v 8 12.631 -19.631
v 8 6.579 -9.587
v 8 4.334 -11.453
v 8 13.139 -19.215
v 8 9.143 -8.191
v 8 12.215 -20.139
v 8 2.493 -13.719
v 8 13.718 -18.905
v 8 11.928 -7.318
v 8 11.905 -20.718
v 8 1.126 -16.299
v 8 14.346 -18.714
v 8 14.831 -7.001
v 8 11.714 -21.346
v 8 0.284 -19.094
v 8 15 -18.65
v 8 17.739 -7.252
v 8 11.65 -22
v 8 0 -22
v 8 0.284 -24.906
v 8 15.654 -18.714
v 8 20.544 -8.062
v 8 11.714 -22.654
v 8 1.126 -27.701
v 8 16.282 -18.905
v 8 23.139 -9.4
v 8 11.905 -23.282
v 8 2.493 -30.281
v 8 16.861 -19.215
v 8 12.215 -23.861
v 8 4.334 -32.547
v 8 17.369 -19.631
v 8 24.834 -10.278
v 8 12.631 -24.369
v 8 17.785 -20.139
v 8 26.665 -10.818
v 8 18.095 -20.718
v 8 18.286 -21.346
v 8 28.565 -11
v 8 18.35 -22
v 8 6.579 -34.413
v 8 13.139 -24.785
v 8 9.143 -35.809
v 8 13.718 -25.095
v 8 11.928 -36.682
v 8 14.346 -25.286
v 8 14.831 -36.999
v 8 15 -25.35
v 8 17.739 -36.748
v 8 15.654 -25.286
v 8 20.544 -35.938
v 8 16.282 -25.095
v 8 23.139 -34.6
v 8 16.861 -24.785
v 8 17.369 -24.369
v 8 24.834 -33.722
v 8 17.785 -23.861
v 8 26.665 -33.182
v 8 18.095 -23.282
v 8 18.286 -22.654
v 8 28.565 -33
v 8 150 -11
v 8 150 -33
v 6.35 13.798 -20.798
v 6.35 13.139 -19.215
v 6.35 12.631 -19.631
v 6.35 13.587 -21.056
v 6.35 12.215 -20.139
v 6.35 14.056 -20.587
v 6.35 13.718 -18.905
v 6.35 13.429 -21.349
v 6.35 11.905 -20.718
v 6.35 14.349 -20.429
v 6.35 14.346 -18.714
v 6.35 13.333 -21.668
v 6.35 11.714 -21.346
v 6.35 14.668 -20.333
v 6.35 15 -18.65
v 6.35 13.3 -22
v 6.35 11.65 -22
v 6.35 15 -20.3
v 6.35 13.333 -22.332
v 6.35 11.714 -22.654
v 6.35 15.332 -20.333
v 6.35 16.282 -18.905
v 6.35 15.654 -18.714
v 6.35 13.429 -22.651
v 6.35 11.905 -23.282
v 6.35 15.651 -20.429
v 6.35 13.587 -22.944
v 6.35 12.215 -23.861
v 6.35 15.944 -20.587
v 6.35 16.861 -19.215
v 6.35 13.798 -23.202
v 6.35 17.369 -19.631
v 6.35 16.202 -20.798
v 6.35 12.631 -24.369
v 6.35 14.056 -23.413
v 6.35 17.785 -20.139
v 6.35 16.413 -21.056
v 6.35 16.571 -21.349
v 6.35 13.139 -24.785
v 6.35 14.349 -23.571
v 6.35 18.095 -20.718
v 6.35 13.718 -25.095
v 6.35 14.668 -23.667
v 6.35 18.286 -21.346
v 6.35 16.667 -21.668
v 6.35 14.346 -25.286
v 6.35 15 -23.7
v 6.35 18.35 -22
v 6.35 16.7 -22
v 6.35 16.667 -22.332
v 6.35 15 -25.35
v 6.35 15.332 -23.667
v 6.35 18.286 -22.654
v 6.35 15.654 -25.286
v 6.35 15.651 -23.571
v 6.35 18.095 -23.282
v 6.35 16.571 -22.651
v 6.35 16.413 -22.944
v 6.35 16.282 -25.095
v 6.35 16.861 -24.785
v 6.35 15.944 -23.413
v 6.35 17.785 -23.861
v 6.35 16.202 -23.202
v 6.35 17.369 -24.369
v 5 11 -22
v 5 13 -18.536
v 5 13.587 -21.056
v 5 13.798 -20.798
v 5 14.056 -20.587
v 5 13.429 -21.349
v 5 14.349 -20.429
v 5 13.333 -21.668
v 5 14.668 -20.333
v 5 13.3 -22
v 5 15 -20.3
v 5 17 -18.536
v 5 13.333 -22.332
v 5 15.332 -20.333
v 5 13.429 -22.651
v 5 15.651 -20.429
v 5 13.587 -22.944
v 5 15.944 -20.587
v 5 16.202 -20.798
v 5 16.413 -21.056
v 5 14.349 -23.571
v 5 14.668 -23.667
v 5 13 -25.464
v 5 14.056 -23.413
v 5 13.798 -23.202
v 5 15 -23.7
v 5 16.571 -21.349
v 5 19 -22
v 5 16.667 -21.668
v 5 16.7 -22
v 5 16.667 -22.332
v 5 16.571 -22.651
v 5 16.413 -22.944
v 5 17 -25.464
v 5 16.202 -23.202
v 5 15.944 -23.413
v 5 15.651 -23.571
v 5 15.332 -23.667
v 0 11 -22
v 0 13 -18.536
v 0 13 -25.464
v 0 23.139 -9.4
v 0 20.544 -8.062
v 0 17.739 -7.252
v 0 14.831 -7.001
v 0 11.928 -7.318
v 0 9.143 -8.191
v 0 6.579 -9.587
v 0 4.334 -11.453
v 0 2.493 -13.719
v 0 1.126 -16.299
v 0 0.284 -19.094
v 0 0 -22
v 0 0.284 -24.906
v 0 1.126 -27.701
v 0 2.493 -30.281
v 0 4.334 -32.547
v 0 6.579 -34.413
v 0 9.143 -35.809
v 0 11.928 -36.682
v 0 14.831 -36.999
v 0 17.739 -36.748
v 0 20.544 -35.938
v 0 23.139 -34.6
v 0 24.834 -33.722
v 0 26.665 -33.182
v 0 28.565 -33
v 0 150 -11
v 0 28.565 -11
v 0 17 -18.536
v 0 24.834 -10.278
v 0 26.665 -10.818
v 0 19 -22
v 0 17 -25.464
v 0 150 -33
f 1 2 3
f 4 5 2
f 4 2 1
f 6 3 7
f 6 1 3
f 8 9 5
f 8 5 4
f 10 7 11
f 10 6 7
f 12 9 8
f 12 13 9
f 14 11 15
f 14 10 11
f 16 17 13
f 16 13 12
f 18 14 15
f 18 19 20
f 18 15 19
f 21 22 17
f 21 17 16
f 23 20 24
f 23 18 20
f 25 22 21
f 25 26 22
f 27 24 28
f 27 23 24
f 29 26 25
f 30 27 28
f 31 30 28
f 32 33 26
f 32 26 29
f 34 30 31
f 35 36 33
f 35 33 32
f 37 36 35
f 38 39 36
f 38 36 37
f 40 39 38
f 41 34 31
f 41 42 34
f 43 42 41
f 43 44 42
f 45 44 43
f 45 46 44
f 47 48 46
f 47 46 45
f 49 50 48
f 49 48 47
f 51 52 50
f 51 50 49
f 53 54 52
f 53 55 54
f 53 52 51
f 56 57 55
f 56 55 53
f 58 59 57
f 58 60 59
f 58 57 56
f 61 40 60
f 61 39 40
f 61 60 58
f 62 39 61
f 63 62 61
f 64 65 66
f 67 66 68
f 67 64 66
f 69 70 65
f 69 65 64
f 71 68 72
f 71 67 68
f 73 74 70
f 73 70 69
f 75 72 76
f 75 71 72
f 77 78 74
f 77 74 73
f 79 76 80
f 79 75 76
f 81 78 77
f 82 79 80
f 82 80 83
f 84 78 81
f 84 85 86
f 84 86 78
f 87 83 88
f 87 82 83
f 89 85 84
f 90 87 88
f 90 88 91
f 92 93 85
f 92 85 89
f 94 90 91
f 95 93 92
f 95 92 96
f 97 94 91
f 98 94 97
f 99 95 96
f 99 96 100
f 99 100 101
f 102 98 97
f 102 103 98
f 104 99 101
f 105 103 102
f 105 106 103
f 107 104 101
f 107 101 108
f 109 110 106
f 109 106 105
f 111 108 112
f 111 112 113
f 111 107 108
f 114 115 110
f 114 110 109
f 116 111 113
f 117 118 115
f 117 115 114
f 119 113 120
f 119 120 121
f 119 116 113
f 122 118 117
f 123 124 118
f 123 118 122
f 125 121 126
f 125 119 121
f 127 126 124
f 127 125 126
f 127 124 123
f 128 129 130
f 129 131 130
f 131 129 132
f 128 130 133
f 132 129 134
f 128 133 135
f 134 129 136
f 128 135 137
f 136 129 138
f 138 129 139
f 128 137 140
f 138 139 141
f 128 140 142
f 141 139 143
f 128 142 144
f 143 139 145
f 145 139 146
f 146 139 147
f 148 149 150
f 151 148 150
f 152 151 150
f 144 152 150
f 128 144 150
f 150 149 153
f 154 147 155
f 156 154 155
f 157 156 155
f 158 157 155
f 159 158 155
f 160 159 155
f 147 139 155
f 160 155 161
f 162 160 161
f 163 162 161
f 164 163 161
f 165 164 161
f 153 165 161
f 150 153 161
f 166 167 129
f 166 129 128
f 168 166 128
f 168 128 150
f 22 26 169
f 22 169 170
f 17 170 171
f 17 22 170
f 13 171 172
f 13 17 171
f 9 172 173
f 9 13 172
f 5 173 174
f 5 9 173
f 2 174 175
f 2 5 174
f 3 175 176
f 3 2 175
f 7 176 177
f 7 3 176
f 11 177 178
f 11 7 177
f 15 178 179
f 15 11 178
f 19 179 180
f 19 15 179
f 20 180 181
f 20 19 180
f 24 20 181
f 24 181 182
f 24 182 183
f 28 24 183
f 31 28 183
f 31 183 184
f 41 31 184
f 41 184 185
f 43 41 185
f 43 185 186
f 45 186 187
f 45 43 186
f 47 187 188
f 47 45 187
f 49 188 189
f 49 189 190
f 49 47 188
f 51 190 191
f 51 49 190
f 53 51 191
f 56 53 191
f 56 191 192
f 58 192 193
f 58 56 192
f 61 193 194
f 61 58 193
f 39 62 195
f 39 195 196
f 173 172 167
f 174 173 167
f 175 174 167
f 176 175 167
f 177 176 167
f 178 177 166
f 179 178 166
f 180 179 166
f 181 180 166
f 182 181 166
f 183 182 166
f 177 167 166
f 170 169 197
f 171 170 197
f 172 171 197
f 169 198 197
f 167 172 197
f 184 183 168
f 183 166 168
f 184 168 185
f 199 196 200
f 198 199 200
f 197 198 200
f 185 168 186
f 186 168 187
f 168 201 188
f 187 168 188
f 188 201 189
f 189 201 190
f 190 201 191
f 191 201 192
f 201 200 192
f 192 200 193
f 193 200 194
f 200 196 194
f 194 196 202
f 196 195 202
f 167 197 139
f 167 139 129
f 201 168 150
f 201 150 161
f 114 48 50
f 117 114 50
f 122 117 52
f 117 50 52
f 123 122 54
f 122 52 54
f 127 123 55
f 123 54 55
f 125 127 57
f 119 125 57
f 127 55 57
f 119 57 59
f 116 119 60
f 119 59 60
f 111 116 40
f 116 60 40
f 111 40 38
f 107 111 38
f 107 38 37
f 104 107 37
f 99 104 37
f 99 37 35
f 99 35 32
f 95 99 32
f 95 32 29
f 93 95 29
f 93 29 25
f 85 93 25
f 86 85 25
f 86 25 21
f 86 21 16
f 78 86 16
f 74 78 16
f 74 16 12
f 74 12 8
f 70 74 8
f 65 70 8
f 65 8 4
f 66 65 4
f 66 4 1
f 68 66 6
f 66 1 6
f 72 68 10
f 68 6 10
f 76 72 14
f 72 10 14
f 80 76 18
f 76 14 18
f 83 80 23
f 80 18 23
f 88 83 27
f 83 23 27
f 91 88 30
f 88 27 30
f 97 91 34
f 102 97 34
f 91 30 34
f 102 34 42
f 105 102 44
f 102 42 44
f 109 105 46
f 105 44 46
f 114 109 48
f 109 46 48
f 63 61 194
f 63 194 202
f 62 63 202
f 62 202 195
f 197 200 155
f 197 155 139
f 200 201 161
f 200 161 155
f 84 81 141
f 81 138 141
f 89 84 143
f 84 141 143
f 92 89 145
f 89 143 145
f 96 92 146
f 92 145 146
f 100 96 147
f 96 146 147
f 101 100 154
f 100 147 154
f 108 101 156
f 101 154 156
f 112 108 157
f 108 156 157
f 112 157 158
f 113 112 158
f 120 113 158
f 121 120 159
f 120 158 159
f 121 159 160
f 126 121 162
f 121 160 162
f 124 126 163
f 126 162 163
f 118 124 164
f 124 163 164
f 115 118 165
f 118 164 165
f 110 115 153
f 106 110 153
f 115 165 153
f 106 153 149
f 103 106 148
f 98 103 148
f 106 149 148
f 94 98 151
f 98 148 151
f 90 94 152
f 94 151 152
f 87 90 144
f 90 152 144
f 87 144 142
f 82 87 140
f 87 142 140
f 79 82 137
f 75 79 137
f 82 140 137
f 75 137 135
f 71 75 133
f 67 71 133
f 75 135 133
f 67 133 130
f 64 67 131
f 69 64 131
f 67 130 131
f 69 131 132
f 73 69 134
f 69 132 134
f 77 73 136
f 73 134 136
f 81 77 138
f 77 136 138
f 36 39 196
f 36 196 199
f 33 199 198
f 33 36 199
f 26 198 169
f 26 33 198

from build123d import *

# Parameters (mm, degrees)
SKETCH1_W                       = 44
SKETCH1_H                       = 150
BOSS_EXTRUDE1_DEPTH             = 8
CUT_EXTRUDE3_DEPTH              = 5
SKETCH3_OUTSIDE_W               = 77.304
SKETCH3_OUTSIDE_H               = 183.304
CUT_EXTRUDE4_DEPTH              = 8
CBORE_FOR_M3_SBHCS1_D           = 3.4
CBORE_FOR_M3_SBHCS1_CBORE_D     = 6.7
CBORE_FOR_M3_SBHCS1_CBORE_DEPTH = 1.65


with BuildPart() as part:
    # Sketch1 → Boss-Extrude1 (new body)
    with BuildSketch(Plane(origin=(0, 0, 0), x_dir=(0, 0, -1), z_dir=(1, 0, 0))):
        with Locations((22, 75)):
            Rectangle(SKETCH1_W, SKETCH1_H)
    extrude(amount=BOSS_EXTRUDE1_DEPTH)

    # Sketch2 → Cut-Extrude3 (cut)
    with BuildSketch(Plane(origin=(0, 0, 0), x_dir=(0, 0, -1), z_dir=(1, 0, 0))):
        Polygon((22, 19), (18.535898385, 17), (18.535898385, 13), (22, 11), (25.464101615, 13), (25.464101615, 17), align=None)
    extrude(amount=CUT_EXTRUDE3_DEPTH, mode=Mode.SUBTRACT)

    # Sketch3 outside → Cut-Extrude4 (cut)
    with BuildSketch(Plane(origin=(8, 0, 0), x_dir=(0, 0, -1), z_dir=(1, 0, 0))):
        with Locations((22, 75)):
            Rectangle(SKETCH3_OUTSIDE_W, SKETCH3_OUTSIDE_H)
        with BuildLine():
            Line((11, 150), (11, 28.564659966))
            ThreePointArc((11, 28.564659966), (10.591663047, 25.736232842), (9.4, 23.13879598))
            ThreePointArc((9.4, 23.13879598), (22, 0), (34.6, 23.13879598))
            ThreePointArc((34.6, 23.13879598), (33.408336953, 25.736232842), (33, 28.564659966))
            Line((33, 28.564659966), (33, 150))
            Line((33, 150), (11, 150))
        make_face(mode=Mode.SUBTRACT)
    extrude(amount=-CUT_EXTRUDE4_DEPTH, mode=Mode.SUBTRACT)

    # CBORE for M3 SBHCS1 (through all)
    with Locations(Plane(origin=(8, 0, 0), x_dir=(0, 0, -1), z_dir=(1, 0, 0))):
        with Locations((22, 15)):
            CounterBoreHole(CBORE_FOR_M3_SBHCS1_D / 2, CBORE_FOR_M3_SBHCS1_CBORE_D / 2, CBORE_FOR_M3_SBHCS1_CBORE_DEPTH)


solid = part.part
